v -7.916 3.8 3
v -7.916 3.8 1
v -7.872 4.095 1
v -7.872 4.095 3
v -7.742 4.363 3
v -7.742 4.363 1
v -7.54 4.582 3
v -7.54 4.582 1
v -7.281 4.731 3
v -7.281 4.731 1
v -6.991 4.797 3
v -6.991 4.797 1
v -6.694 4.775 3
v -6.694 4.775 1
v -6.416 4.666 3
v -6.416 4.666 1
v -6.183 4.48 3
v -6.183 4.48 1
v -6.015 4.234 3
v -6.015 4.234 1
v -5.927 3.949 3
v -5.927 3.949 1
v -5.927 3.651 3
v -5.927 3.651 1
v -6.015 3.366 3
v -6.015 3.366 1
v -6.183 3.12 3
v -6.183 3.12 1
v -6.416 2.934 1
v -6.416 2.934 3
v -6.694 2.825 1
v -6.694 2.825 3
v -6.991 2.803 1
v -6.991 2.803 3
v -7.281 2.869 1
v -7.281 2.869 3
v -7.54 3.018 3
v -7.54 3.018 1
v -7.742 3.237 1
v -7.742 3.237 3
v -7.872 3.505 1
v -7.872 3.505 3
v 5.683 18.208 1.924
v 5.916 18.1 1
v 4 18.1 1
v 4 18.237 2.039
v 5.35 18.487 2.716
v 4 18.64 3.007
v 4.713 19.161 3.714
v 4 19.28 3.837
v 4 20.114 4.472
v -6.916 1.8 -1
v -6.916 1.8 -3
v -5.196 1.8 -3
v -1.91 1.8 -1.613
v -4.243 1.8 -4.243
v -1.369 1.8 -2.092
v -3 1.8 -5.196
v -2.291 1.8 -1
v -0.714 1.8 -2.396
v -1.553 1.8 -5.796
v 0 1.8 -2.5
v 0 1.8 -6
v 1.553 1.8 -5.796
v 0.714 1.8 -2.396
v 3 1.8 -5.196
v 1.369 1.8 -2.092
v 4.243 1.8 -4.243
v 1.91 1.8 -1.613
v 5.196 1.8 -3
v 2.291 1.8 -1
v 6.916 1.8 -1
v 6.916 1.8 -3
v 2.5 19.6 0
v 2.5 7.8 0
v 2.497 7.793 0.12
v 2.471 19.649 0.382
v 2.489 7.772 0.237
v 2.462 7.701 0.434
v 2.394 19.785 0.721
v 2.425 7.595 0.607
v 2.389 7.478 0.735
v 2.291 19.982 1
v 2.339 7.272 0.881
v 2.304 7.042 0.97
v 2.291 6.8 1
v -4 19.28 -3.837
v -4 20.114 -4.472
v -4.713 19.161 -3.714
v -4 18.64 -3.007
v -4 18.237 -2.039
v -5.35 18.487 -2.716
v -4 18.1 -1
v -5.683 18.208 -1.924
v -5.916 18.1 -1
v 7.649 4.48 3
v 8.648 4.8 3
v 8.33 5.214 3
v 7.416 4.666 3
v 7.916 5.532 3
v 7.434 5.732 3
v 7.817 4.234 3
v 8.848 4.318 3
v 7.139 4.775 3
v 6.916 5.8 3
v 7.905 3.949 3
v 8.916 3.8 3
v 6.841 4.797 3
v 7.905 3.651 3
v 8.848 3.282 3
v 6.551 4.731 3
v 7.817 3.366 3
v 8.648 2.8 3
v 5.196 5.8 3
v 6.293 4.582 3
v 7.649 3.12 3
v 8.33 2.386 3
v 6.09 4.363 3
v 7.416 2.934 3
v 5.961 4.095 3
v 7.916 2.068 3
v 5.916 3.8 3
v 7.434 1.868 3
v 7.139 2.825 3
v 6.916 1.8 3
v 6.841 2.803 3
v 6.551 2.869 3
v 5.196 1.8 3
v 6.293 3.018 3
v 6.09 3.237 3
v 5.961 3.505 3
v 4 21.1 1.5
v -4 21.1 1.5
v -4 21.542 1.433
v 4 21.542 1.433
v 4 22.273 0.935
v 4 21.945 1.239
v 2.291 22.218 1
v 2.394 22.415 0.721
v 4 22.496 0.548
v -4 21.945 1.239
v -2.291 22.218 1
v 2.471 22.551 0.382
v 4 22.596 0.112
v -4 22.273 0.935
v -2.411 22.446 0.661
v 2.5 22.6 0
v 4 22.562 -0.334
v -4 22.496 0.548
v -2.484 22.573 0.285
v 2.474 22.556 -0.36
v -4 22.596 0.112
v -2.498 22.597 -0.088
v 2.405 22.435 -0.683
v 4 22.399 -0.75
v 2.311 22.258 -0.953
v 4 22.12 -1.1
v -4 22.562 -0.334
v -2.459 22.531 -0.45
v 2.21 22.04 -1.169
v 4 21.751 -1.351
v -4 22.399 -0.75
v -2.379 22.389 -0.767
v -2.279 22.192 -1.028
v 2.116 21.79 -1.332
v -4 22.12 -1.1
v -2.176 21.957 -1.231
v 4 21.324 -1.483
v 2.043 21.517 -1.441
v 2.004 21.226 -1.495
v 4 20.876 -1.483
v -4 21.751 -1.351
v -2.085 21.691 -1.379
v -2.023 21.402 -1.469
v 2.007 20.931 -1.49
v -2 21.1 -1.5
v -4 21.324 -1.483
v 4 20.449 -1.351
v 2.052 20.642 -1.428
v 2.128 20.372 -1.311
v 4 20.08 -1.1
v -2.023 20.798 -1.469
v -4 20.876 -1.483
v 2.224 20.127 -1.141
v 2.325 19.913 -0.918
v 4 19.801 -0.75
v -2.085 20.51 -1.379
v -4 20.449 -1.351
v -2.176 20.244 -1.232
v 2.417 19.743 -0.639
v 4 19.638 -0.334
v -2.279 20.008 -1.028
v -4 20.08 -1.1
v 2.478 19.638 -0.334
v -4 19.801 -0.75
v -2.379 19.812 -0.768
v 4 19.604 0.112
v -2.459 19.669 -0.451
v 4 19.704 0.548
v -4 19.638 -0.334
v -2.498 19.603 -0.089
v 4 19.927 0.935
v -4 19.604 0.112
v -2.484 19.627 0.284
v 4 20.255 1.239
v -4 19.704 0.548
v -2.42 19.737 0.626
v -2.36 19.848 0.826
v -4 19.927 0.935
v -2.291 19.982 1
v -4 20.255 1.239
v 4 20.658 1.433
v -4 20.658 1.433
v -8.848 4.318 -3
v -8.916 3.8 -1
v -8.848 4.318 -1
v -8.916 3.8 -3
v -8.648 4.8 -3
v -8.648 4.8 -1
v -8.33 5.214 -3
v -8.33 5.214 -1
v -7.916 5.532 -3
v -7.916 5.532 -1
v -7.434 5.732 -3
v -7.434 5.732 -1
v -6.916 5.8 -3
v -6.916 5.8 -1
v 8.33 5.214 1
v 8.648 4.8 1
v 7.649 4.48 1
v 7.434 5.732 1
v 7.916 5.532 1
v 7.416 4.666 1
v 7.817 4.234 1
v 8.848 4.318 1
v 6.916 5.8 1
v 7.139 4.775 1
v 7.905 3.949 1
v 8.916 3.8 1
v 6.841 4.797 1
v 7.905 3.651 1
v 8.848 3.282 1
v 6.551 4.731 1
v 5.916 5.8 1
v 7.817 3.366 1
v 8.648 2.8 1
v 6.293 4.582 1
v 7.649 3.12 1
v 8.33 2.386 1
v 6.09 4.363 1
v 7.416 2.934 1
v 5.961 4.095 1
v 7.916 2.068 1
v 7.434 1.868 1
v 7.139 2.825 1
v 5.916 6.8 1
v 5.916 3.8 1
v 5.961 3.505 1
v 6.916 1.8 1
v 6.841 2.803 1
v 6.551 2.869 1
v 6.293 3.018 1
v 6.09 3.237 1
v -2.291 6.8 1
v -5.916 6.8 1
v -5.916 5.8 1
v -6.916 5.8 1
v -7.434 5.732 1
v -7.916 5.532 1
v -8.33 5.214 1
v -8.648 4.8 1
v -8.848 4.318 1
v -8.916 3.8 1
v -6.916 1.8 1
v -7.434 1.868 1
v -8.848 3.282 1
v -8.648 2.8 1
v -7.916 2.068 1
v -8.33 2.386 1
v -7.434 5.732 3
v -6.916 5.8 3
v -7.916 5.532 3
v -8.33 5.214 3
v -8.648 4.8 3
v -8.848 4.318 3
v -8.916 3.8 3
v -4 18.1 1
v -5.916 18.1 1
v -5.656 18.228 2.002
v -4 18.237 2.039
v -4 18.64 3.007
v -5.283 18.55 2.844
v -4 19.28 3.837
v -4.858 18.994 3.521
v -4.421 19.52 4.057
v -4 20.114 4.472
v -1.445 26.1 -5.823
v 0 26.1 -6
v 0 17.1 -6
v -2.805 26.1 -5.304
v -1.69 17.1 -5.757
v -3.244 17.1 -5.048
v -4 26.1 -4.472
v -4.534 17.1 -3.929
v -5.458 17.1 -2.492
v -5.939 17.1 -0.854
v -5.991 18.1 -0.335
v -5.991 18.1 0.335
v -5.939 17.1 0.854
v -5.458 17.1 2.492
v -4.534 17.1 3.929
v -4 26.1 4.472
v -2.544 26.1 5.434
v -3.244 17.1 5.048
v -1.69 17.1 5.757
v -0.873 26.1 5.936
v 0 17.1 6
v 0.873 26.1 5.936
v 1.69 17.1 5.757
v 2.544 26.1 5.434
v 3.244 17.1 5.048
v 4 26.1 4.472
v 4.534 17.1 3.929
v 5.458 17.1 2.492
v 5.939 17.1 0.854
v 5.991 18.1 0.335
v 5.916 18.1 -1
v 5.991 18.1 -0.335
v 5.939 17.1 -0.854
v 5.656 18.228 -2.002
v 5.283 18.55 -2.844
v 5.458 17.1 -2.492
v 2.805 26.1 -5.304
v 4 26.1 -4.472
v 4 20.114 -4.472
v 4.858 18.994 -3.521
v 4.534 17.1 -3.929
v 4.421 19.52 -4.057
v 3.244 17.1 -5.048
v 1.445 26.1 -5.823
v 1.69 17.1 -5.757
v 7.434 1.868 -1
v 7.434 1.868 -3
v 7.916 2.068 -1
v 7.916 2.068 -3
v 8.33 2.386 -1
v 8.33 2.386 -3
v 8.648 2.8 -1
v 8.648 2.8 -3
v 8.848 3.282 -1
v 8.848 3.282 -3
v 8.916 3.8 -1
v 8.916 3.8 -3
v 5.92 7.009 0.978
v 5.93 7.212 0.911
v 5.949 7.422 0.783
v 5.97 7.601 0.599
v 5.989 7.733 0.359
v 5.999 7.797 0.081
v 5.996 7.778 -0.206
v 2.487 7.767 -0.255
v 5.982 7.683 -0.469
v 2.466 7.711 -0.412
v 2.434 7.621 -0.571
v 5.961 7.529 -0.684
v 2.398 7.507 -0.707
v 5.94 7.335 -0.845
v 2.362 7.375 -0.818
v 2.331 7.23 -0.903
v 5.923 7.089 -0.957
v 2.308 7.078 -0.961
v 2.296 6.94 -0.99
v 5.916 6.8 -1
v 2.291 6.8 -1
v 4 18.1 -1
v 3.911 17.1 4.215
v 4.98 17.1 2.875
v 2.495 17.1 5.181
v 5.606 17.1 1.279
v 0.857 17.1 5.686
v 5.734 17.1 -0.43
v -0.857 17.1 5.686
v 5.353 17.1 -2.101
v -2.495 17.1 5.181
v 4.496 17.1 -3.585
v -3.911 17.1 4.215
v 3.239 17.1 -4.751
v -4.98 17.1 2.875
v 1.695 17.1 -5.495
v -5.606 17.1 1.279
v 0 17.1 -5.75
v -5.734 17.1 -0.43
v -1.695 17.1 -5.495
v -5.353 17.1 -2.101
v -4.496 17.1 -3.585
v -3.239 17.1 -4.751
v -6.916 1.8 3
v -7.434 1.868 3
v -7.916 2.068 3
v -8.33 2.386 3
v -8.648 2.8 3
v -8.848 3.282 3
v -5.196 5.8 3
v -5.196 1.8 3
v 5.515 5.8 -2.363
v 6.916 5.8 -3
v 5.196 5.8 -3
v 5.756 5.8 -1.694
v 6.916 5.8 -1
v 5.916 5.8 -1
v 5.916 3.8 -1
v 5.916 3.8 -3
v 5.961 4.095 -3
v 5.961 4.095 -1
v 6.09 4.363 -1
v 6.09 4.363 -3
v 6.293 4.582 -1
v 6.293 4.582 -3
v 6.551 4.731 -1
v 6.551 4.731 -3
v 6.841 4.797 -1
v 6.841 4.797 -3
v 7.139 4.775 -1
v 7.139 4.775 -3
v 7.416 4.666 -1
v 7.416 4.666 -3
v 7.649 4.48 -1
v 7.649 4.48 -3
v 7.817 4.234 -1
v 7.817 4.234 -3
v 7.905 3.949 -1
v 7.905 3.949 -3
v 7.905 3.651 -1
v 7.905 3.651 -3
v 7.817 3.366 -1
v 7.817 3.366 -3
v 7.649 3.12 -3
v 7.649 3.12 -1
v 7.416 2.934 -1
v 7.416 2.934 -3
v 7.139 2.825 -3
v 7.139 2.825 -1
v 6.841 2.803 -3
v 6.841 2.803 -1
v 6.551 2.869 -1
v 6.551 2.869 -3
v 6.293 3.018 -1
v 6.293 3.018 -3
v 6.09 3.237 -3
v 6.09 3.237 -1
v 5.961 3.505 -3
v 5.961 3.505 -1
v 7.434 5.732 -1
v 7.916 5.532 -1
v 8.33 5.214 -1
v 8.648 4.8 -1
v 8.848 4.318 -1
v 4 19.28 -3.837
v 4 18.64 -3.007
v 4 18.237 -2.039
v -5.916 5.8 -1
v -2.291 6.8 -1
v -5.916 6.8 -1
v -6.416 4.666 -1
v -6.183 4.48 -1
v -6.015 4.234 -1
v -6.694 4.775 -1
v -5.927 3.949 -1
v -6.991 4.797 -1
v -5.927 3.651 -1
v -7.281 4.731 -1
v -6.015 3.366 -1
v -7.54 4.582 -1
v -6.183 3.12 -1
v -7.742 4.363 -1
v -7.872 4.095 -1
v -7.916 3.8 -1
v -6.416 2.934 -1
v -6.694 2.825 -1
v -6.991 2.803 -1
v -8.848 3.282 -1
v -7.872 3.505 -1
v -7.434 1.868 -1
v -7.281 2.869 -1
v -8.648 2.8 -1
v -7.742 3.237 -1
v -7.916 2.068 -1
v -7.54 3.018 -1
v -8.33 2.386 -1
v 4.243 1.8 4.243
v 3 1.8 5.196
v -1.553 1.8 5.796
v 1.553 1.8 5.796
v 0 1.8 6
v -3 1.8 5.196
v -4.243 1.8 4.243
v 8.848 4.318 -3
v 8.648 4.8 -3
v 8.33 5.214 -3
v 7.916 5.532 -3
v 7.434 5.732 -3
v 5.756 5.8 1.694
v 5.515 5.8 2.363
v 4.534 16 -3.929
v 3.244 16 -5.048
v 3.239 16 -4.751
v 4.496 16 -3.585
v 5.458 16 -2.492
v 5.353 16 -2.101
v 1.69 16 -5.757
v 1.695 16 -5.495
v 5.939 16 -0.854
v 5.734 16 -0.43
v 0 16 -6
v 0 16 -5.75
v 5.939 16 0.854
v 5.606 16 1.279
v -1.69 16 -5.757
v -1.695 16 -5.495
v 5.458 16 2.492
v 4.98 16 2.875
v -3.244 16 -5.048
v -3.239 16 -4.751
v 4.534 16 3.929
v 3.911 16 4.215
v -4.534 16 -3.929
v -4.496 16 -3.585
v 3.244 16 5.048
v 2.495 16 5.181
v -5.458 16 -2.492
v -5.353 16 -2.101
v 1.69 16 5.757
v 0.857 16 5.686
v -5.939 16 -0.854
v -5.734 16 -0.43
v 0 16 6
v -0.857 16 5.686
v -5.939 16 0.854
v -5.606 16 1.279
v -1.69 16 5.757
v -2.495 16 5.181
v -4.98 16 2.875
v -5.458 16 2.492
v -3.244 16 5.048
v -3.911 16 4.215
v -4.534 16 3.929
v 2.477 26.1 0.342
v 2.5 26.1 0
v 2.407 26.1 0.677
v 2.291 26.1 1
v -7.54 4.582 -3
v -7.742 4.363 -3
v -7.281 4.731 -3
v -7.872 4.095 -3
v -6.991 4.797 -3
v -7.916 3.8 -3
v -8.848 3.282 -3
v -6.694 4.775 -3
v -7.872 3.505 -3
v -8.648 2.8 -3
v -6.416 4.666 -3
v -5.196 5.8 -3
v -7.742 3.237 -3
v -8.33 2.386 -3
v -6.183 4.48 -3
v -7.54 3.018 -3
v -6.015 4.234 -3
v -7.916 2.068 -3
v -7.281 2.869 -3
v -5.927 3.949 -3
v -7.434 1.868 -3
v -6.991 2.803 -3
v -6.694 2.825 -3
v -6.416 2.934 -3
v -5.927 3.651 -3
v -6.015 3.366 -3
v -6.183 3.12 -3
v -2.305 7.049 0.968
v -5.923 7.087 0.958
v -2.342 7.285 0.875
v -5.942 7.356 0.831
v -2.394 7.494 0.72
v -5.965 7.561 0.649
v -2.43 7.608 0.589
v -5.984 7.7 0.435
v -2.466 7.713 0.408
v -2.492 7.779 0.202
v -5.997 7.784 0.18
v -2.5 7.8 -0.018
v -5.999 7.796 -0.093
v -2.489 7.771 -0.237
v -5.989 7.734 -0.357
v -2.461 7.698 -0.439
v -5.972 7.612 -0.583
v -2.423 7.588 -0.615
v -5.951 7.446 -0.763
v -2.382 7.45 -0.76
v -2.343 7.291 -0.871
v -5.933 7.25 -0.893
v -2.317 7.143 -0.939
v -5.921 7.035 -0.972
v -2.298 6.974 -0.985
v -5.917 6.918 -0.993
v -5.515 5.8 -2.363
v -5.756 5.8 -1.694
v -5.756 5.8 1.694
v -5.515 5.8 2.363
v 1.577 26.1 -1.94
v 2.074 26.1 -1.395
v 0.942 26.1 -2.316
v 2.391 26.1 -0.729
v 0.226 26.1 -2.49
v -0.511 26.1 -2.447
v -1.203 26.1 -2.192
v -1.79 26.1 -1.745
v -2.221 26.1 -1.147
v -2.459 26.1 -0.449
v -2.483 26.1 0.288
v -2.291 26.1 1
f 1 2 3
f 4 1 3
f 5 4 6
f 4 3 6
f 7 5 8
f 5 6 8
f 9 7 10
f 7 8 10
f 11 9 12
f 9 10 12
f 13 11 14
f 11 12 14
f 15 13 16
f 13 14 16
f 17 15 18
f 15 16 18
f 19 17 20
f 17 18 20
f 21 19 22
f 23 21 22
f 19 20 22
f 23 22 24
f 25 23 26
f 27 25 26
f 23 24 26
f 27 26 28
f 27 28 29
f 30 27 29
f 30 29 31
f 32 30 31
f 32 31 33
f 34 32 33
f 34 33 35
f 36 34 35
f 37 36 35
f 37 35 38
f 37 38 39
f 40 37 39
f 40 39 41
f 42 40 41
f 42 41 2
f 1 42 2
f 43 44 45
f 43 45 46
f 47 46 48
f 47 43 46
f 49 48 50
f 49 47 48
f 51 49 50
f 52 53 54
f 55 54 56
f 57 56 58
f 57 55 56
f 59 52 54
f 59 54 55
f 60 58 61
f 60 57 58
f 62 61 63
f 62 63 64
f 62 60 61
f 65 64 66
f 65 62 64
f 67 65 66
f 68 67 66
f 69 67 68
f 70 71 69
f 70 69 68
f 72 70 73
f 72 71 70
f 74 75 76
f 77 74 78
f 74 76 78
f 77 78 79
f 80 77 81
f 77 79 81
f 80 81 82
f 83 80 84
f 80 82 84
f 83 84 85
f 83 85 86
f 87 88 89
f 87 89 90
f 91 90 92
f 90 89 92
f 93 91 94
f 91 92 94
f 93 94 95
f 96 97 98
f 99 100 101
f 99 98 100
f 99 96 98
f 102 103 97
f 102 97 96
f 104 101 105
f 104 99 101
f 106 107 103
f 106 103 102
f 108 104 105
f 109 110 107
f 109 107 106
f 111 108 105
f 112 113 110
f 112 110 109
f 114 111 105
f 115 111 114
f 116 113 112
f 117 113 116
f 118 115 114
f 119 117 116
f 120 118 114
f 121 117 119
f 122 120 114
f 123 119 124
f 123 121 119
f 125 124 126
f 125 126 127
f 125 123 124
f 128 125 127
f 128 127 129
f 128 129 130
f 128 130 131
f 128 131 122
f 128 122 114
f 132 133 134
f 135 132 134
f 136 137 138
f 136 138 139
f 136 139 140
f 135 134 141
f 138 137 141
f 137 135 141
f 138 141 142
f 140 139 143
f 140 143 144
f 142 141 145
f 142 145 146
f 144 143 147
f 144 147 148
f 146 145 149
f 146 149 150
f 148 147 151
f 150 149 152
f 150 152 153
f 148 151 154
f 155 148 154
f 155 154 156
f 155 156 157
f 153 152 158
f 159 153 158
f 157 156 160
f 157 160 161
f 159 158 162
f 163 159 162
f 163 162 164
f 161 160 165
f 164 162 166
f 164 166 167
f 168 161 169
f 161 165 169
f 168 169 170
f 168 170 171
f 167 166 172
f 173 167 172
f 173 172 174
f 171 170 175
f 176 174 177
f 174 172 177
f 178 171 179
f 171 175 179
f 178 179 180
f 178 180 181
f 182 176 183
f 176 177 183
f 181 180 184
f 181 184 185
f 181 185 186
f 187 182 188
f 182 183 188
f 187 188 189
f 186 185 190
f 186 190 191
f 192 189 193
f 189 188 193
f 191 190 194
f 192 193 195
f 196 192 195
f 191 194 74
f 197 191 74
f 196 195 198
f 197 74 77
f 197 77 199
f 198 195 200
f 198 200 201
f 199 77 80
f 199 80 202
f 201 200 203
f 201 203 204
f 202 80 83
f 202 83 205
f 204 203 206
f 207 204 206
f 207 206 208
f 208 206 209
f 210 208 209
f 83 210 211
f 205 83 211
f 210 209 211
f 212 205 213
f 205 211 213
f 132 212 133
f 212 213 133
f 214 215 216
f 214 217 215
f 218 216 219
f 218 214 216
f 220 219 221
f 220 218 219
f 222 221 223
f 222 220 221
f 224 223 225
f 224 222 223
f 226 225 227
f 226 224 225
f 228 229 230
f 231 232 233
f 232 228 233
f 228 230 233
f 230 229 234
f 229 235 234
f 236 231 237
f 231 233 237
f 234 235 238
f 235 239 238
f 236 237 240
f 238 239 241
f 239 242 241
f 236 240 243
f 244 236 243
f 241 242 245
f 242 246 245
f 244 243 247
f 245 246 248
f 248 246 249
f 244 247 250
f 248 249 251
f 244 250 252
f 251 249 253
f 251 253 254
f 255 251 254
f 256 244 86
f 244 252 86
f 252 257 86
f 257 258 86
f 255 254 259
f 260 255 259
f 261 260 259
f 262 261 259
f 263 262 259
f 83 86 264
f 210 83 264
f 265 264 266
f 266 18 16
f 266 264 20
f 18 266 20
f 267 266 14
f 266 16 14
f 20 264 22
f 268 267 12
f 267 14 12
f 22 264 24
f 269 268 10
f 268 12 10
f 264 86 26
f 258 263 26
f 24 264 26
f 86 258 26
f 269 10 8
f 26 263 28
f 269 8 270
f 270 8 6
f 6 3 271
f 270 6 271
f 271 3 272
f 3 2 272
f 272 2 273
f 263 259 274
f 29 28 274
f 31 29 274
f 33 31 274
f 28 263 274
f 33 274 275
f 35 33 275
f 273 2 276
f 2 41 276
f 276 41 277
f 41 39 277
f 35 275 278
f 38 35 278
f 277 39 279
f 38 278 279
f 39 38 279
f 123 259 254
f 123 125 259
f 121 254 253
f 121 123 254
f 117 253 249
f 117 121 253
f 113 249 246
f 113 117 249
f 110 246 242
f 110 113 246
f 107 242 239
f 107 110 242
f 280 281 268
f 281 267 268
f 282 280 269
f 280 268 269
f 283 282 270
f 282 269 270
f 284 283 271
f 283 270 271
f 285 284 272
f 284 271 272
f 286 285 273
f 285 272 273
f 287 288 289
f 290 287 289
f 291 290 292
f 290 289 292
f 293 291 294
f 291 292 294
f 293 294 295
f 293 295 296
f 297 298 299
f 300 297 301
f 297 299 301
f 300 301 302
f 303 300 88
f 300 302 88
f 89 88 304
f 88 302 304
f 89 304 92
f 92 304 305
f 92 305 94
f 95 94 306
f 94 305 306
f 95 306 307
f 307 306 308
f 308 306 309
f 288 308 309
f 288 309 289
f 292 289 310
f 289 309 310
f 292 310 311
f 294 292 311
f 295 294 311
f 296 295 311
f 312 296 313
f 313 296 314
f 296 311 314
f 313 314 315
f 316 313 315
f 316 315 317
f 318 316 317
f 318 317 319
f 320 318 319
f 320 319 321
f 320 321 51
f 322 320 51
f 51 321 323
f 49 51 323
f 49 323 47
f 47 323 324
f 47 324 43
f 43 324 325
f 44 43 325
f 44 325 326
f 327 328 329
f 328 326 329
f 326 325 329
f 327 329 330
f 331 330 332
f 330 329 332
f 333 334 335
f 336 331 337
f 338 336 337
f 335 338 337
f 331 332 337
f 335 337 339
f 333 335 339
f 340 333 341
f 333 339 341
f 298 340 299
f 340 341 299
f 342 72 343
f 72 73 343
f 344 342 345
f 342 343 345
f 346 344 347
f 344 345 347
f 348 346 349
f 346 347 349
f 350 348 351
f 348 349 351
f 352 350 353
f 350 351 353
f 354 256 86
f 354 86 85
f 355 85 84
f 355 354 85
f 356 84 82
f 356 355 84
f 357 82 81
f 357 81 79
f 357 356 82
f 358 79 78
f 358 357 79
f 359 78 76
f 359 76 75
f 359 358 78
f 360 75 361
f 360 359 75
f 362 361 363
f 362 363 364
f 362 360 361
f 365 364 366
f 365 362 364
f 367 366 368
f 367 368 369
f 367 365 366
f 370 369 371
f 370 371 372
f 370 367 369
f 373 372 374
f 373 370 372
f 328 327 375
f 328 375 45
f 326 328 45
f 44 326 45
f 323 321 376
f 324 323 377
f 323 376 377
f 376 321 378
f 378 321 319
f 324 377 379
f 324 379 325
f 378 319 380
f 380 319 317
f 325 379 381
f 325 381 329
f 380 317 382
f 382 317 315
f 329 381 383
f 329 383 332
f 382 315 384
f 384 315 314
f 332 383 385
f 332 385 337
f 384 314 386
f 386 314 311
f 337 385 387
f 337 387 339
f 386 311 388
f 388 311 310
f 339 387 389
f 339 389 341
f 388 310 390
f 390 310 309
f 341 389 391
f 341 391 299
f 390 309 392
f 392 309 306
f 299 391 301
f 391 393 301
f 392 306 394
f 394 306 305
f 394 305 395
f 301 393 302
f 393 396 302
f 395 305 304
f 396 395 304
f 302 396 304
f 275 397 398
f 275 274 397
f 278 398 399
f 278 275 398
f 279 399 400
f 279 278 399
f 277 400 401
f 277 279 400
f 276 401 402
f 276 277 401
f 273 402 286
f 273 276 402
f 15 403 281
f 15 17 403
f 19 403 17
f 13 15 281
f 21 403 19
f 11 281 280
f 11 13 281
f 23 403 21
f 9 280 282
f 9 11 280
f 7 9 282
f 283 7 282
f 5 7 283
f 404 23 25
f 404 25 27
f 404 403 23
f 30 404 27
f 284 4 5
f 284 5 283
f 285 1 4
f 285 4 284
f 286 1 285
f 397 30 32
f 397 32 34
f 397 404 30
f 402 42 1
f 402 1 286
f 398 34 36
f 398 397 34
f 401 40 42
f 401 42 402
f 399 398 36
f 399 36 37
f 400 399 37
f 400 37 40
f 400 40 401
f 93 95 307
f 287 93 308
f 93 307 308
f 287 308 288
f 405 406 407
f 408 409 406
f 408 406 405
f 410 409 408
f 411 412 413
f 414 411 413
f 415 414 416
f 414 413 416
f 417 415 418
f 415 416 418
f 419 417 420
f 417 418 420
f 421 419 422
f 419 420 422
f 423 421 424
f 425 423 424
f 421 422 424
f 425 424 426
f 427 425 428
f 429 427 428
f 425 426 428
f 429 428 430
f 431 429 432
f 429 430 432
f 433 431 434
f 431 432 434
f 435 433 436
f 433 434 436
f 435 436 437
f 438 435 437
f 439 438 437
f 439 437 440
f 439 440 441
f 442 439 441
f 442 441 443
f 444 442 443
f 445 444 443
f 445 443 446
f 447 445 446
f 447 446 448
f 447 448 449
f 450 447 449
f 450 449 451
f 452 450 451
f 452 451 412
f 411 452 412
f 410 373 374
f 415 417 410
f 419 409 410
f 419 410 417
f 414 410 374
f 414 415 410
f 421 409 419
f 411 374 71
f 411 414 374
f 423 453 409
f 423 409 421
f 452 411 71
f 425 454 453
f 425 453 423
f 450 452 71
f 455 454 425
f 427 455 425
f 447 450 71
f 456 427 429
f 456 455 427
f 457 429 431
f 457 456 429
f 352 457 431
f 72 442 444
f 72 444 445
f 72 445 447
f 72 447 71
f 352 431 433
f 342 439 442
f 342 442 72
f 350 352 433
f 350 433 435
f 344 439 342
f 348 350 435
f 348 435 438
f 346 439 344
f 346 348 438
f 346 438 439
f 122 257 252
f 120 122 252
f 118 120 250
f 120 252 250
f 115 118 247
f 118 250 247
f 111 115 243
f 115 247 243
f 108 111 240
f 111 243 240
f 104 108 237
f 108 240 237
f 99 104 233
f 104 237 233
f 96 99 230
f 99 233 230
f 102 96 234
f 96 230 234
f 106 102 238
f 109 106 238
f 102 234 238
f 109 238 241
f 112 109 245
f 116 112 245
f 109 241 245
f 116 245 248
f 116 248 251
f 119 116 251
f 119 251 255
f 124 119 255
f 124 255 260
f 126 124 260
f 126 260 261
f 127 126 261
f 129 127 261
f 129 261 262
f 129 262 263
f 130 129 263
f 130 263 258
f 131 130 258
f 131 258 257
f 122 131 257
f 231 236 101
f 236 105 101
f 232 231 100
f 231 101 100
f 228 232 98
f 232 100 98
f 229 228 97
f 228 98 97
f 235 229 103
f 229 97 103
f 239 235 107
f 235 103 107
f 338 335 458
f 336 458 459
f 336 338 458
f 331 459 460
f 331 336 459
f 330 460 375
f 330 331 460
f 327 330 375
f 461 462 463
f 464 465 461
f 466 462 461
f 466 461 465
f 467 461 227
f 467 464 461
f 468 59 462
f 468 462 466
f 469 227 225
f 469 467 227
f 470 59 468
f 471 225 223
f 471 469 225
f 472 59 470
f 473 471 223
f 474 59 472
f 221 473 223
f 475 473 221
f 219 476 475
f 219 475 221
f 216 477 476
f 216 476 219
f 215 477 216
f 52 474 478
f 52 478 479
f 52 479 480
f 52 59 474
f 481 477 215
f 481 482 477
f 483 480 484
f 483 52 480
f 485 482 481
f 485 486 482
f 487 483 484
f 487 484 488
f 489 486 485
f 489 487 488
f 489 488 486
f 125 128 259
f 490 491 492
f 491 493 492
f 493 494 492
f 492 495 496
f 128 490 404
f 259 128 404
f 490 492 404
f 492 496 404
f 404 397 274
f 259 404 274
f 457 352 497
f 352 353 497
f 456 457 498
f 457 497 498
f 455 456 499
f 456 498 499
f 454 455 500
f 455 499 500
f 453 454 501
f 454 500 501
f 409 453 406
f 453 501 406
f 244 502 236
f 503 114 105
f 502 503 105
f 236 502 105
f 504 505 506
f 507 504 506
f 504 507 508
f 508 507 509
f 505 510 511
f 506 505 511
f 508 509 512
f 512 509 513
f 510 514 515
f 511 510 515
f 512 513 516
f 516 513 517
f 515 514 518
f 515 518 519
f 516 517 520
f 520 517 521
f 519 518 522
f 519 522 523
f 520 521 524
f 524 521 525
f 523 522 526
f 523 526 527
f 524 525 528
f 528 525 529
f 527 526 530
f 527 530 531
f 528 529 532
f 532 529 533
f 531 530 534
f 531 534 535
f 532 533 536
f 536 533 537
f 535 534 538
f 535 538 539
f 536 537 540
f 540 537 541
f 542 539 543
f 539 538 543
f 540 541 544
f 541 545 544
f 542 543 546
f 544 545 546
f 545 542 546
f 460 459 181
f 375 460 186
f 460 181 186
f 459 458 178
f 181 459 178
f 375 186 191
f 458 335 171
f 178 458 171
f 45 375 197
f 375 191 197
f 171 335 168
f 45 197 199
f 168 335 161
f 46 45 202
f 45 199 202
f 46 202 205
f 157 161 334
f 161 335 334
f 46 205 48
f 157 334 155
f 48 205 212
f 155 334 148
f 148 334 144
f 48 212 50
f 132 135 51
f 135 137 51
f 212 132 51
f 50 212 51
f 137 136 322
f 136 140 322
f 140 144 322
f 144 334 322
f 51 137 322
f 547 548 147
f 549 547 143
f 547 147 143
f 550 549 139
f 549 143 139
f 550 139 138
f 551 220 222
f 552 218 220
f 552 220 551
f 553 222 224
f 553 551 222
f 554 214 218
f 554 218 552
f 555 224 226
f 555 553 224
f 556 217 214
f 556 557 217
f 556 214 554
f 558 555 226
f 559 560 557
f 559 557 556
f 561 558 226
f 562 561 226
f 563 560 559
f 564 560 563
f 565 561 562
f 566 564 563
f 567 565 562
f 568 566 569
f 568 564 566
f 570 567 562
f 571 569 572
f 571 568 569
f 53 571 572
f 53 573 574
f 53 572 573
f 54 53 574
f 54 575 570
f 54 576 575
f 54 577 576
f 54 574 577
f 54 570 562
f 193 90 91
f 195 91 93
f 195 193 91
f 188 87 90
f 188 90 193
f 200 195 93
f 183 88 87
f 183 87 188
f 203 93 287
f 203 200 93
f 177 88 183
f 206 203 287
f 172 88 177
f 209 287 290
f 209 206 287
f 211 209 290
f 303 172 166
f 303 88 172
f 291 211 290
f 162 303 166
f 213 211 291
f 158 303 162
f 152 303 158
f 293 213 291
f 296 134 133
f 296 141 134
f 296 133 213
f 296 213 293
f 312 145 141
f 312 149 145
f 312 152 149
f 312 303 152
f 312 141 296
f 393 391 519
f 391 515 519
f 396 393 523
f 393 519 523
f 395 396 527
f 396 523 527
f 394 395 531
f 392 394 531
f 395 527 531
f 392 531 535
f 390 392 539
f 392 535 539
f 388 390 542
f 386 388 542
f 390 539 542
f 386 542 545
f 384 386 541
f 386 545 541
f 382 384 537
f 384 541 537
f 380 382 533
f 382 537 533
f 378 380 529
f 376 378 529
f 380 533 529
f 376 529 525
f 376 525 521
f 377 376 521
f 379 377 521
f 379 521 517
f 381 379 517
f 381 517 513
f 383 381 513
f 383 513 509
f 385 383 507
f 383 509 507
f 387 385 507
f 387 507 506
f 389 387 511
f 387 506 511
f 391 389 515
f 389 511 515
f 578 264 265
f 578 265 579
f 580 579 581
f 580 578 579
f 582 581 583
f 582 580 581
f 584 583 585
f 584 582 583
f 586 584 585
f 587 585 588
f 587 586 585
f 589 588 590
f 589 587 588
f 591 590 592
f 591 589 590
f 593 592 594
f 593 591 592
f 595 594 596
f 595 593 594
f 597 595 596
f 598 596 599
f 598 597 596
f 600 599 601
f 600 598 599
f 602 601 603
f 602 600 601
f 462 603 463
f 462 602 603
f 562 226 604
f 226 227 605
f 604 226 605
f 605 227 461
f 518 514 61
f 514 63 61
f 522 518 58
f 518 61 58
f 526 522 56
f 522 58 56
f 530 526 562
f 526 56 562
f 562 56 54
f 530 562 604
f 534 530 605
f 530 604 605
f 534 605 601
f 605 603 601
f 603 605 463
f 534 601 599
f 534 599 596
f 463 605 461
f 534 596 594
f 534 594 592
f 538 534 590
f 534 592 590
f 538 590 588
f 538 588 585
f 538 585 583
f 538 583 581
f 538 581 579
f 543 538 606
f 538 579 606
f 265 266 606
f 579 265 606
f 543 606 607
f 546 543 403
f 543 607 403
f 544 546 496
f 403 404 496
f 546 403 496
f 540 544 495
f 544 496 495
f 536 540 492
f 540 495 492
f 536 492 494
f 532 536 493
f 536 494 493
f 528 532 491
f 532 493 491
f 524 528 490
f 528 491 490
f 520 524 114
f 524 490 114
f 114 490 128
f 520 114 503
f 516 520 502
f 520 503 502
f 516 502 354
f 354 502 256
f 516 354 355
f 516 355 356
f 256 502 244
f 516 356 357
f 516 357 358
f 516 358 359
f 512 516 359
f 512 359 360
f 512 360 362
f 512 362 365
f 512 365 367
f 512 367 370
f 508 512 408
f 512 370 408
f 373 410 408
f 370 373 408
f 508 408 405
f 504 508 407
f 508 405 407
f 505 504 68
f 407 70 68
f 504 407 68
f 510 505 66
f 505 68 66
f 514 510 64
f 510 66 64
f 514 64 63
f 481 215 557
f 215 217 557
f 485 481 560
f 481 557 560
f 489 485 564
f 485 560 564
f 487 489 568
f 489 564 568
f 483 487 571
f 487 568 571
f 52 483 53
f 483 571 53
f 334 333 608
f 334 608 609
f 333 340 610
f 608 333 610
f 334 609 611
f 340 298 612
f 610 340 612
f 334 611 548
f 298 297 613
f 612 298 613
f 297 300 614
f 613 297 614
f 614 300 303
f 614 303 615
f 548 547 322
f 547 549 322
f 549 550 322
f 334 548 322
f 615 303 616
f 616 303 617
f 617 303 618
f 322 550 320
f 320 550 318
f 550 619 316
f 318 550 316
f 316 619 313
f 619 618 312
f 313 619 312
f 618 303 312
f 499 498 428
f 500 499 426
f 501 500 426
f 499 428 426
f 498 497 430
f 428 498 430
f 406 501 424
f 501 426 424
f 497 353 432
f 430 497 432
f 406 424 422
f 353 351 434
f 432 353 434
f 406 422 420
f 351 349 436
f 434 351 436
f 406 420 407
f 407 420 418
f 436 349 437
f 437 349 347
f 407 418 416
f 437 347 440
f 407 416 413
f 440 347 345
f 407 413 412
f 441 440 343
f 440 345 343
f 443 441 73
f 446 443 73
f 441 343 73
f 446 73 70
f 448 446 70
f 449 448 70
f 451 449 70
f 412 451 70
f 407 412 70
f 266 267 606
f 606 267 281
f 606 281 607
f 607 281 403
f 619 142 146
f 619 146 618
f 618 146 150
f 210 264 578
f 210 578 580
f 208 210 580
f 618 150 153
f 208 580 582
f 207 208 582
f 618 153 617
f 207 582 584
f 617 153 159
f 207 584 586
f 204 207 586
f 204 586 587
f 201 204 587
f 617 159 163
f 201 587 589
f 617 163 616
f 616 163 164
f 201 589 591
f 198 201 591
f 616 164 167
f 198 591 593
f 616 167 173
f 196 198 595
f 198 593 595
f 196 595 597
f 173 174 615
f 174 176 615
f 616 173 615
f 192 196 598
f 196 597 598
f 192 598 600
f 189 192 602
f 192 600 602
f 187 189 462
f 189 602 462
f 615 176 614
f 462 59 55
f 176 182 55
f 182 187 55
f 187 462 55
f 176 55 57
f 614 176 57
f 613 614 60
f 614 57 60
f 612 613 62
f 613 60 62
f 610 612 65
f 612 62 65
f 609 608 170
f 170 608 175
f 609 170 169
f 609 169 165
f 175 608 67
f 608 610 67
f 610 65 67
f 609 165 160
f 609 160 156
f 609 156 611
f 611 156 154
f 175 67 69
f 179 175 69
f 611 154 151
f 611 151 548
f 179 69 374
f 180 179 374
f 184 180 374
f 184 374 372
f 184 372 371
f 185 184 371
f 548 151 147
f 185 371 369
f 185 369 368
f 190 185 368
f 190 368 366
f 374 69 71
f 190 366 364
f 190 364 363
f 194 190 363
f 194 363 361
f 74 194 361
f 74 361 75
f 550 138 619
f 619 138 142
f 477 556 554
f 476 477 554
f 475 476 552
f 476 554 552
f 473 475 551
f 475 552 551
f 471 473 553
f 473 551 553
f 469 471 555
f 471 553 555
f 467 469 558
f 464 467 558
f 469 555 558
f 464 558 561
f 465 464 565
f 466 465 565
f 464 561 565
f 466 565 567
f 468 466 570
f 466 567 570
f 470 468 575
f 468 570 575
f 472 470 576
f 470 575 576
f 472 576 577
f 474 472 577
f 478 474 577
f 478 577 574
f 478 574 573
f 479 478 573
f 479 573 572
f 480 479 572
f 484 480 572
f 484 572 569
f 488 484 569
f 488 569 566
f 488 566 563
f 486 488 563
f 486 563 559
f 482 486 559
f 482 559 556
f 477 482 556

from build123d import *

# Parameters (mm, degrees)
CUT_EXTRUDE2_DEPTH  = 2
SKETCH4_R           = 1.5
CUT_EXTRUDE3_DEPTH  = 30.819624498
CUT_EXTRUDE4_DEPTH  = 27.804663864
CUT_EXTRUDE5_START  = -10
SKETCH6_R           = 8
SKETCH6_R_2         = 6
CUT_EXTRUDE5_DEPTH  = 10
CUT_EXTRUDE6_DEPTH  = 30.346379825
BOSS_EXTRUDE1_DEPTH = 4
SKETCH9_R           = 1
CUT_EXTRUDE7_DEPTH  = 30.012178231
FILLET1_R           = 2


with BuildPart() as part:
    # Sketch2 → Revolve1 (revolve)
    with BuildSketch(Plane.XY, mode=Mode.PRIVATE) as revolve1_sk:
        Polygon((0, 26.1), (-6, 26.1), (-6, 17.1), (-5.75, 17.1), (-5.75, 16), (-6, 16), (-6, 4), (-8, 4), (-8, 0), (-7, 0), (-7, 1.8), (0, 1.8), align=None)
    revolve(revolve1_sk.sketch.rotate(Axis((0, 0, 0), (0, 1, 0)), 270), axis=Axis((0, 0, 0), (0, 1, 0)))

    # Sketch3 → Cut-Extrude2 (cut)
    with BuildSketch(Plane.ZY.offset(6)):
        with BuildLine():
            Line((9, 26.1), (-9, 26.1))
            ThreePointArc((-9, 26.1), (-6.171572875, 24.928427125), (-5, 22.1))
            ThreePointArc((-5, 22.1), (-3.828427125, 19.271572875), (-1, 18.1))
            Line((-1, 18.1), (1, 18.1))
            ThreePointArc((1, 18.1), (3.828427125, 19.271572875), (5, 22.1))
            ThreePointArc((5, 22.1), (6.171572875, 24.928427125), (9, 26.1))
        make_face()
    cut_extrude2 = extrude(amount=-CUT_EXTRUDE2_DEPTH, mode=Mode.SUBTRACT)

    # Mirror1: Cut-Extrude2 across plane
    add(cut_extrude2.mirror(Plane(origin=(0, 0, 0), x_dir=(0, 0, 1), z_dir=(1, 0, 0))), mode=Mode.SUBTRACT)

    # Sketch4 → Cut-Extrude3 (cut, through all)
    with BuildSketch(Plane.ZY.offset(4)):
        with Locations((0, 21.1)):
            Circle(SKETCH4_R)
    extrude(amount=-CUT_EXTRUDE3_DEPTH, mode=Mode.SUBTRACT)

    # Sketch5 → Cut-Extrude4 (cut, through all)
    with BuildSketch(Plane.XZ.offset(-1.8)):
        with BuildLine():
            Line((2.291287847, 1), (-2.291287847, 1))
            ThreePointArc((-2.291287847, 1), (-0.510774109, -2.447265782), (2.5, 0))
            ThreePointArc((2.5, 0), (2.447265782, 0.510774109), (2.291287847, 1))
        make_face()
    extrude(amount=-CUT_EXTRUDE4_DEPTH, mode=Mode.SUBTRACT)

    # Sketch6 → Cut-Extrude5 (cut)
    with BuildSketch(Plane(origin=(0, 4, 0), x_dir=(1, 0, 0), z_dir=(0, 1, 0)).offset(CUT_EXTRUDE5_START)):
        Circle(SKETCH6_R)
        with Locations(Location((0, 0, 0), (0, 0, 90))):
            Circle(SKETCH6_R_2, mode=Mode.SUBTRACT)
    extrude(amount=CUT_EXTRUDE5_DEPTH, mode=Mode.SUBTRACT)

    # Sketch7 → Cut-Extrude6 (cut, through all)
    with BuildSketch(Plane(origin=(6, 0, 0), x_dir=(0, 0, -1), z_dir=(1, 0, 0))):
        with BuildLine():
            Line((-1, 1.8), (-1, 6.8))
            ThreePointArc((-1, 6.8), (0, 7.8), (1, 6.8))
            Line((1, 6.8), (1, 1.8))
            Line((1, 1.8), (-1, 1.8))
        make_face()
    extrude(amount=-CUT_EXTRUDE6_DEPTH, mode=Mode.SUBTRACT)

    # Sketch8 → Boss-Extrude1 (add)
    with BuildSketch(Plane.XZ.offset(-1.8)):
        with BuildLine():
            Line((-8.916079783, -3), (-5.196152423, -3))
            ThreePointArc((-5.196152423, -3), (-5.645389814, -2.032135293), (-5.916079783, -1))
            Line((-5.916079783, -1), (-8.916079783, -1))
            Line((-8.916079783, -1), (-8.916079783, -3))
        make_face()
        with BuildLine():
            ThreePointArc((-5.916079783, 1), (-5.645389814, 2.032135293), (-5.196152423, 3))
            Line((-5.196152423, 3), (-8.916079783, 3))
            Line((-8.916079783, 3), (-8.916079783, 1))
            Line((-8.916079783, 1), (-5.916079783, 1))
        make_face()
        with BuildLine():
            ThreePointArc((5.196152423, 3), (5.645389814, 2.032135293), (5.916079783, 1))
            Line((5.916079783, 1), (8.916079783, 1))
            Line((8.916079783, 1), (8.916079783, 3))
            Line((8.916079783, 3), (5.196152423, 3))
        make_face()
        with BuildLine():
            ThreePointArc((5.196152423, -3), (5.645389814, -2.032135293), (5.916079783, -1))
            Line((5.916079783, -1), (8.916079783, -1))
            Line((8.916079783, -1), (8.916079783, -3))
            Line((8.916079783, -3), (5.196152423, -3))
        make_face()
    extrude(amount=-BOSS_EXTRUDE1_DEPTH)

    # Sketch9 → Cut-Extrude7 (cut, through all)
    with BuildSketch(Plane(origin=(0, 0, -3), x_dir=(-1, 0, 0), z_dir=(0, 0, -1))):
        with Locations((-6.916079783, 3.8)):
            Circle(SKETCH9_R)
        with Locations((6.916079783, 3.8)):
            Circle(SKETCH9_R)
    extrude(amount=-CUT_EXTRUDE7_DEPTH, mode=Mode.SUBTRACT)

    # Fillet1
    fillet1_edges = [part.edges().sort_by_distance(p)[0] for p in [
        (-8.916079783, 5.8, 2),
        (-8.916079783, 1.8, 2),
        (-8.916079783, 1.8, -2),
        (-8.916079783, 5.8, -2),
        (8.916079783, 1.8, 2),
        (8.916079783, 5.8, 2),
        (8.916079783, 1.8, -2),
        (8.916079783, 5.8, -2),
    ]]
    fillet(fillet1_edges, radius=FILLET1_R - 0.0001)  # a hair under: the kernel refuses the full size


solid = part.part
